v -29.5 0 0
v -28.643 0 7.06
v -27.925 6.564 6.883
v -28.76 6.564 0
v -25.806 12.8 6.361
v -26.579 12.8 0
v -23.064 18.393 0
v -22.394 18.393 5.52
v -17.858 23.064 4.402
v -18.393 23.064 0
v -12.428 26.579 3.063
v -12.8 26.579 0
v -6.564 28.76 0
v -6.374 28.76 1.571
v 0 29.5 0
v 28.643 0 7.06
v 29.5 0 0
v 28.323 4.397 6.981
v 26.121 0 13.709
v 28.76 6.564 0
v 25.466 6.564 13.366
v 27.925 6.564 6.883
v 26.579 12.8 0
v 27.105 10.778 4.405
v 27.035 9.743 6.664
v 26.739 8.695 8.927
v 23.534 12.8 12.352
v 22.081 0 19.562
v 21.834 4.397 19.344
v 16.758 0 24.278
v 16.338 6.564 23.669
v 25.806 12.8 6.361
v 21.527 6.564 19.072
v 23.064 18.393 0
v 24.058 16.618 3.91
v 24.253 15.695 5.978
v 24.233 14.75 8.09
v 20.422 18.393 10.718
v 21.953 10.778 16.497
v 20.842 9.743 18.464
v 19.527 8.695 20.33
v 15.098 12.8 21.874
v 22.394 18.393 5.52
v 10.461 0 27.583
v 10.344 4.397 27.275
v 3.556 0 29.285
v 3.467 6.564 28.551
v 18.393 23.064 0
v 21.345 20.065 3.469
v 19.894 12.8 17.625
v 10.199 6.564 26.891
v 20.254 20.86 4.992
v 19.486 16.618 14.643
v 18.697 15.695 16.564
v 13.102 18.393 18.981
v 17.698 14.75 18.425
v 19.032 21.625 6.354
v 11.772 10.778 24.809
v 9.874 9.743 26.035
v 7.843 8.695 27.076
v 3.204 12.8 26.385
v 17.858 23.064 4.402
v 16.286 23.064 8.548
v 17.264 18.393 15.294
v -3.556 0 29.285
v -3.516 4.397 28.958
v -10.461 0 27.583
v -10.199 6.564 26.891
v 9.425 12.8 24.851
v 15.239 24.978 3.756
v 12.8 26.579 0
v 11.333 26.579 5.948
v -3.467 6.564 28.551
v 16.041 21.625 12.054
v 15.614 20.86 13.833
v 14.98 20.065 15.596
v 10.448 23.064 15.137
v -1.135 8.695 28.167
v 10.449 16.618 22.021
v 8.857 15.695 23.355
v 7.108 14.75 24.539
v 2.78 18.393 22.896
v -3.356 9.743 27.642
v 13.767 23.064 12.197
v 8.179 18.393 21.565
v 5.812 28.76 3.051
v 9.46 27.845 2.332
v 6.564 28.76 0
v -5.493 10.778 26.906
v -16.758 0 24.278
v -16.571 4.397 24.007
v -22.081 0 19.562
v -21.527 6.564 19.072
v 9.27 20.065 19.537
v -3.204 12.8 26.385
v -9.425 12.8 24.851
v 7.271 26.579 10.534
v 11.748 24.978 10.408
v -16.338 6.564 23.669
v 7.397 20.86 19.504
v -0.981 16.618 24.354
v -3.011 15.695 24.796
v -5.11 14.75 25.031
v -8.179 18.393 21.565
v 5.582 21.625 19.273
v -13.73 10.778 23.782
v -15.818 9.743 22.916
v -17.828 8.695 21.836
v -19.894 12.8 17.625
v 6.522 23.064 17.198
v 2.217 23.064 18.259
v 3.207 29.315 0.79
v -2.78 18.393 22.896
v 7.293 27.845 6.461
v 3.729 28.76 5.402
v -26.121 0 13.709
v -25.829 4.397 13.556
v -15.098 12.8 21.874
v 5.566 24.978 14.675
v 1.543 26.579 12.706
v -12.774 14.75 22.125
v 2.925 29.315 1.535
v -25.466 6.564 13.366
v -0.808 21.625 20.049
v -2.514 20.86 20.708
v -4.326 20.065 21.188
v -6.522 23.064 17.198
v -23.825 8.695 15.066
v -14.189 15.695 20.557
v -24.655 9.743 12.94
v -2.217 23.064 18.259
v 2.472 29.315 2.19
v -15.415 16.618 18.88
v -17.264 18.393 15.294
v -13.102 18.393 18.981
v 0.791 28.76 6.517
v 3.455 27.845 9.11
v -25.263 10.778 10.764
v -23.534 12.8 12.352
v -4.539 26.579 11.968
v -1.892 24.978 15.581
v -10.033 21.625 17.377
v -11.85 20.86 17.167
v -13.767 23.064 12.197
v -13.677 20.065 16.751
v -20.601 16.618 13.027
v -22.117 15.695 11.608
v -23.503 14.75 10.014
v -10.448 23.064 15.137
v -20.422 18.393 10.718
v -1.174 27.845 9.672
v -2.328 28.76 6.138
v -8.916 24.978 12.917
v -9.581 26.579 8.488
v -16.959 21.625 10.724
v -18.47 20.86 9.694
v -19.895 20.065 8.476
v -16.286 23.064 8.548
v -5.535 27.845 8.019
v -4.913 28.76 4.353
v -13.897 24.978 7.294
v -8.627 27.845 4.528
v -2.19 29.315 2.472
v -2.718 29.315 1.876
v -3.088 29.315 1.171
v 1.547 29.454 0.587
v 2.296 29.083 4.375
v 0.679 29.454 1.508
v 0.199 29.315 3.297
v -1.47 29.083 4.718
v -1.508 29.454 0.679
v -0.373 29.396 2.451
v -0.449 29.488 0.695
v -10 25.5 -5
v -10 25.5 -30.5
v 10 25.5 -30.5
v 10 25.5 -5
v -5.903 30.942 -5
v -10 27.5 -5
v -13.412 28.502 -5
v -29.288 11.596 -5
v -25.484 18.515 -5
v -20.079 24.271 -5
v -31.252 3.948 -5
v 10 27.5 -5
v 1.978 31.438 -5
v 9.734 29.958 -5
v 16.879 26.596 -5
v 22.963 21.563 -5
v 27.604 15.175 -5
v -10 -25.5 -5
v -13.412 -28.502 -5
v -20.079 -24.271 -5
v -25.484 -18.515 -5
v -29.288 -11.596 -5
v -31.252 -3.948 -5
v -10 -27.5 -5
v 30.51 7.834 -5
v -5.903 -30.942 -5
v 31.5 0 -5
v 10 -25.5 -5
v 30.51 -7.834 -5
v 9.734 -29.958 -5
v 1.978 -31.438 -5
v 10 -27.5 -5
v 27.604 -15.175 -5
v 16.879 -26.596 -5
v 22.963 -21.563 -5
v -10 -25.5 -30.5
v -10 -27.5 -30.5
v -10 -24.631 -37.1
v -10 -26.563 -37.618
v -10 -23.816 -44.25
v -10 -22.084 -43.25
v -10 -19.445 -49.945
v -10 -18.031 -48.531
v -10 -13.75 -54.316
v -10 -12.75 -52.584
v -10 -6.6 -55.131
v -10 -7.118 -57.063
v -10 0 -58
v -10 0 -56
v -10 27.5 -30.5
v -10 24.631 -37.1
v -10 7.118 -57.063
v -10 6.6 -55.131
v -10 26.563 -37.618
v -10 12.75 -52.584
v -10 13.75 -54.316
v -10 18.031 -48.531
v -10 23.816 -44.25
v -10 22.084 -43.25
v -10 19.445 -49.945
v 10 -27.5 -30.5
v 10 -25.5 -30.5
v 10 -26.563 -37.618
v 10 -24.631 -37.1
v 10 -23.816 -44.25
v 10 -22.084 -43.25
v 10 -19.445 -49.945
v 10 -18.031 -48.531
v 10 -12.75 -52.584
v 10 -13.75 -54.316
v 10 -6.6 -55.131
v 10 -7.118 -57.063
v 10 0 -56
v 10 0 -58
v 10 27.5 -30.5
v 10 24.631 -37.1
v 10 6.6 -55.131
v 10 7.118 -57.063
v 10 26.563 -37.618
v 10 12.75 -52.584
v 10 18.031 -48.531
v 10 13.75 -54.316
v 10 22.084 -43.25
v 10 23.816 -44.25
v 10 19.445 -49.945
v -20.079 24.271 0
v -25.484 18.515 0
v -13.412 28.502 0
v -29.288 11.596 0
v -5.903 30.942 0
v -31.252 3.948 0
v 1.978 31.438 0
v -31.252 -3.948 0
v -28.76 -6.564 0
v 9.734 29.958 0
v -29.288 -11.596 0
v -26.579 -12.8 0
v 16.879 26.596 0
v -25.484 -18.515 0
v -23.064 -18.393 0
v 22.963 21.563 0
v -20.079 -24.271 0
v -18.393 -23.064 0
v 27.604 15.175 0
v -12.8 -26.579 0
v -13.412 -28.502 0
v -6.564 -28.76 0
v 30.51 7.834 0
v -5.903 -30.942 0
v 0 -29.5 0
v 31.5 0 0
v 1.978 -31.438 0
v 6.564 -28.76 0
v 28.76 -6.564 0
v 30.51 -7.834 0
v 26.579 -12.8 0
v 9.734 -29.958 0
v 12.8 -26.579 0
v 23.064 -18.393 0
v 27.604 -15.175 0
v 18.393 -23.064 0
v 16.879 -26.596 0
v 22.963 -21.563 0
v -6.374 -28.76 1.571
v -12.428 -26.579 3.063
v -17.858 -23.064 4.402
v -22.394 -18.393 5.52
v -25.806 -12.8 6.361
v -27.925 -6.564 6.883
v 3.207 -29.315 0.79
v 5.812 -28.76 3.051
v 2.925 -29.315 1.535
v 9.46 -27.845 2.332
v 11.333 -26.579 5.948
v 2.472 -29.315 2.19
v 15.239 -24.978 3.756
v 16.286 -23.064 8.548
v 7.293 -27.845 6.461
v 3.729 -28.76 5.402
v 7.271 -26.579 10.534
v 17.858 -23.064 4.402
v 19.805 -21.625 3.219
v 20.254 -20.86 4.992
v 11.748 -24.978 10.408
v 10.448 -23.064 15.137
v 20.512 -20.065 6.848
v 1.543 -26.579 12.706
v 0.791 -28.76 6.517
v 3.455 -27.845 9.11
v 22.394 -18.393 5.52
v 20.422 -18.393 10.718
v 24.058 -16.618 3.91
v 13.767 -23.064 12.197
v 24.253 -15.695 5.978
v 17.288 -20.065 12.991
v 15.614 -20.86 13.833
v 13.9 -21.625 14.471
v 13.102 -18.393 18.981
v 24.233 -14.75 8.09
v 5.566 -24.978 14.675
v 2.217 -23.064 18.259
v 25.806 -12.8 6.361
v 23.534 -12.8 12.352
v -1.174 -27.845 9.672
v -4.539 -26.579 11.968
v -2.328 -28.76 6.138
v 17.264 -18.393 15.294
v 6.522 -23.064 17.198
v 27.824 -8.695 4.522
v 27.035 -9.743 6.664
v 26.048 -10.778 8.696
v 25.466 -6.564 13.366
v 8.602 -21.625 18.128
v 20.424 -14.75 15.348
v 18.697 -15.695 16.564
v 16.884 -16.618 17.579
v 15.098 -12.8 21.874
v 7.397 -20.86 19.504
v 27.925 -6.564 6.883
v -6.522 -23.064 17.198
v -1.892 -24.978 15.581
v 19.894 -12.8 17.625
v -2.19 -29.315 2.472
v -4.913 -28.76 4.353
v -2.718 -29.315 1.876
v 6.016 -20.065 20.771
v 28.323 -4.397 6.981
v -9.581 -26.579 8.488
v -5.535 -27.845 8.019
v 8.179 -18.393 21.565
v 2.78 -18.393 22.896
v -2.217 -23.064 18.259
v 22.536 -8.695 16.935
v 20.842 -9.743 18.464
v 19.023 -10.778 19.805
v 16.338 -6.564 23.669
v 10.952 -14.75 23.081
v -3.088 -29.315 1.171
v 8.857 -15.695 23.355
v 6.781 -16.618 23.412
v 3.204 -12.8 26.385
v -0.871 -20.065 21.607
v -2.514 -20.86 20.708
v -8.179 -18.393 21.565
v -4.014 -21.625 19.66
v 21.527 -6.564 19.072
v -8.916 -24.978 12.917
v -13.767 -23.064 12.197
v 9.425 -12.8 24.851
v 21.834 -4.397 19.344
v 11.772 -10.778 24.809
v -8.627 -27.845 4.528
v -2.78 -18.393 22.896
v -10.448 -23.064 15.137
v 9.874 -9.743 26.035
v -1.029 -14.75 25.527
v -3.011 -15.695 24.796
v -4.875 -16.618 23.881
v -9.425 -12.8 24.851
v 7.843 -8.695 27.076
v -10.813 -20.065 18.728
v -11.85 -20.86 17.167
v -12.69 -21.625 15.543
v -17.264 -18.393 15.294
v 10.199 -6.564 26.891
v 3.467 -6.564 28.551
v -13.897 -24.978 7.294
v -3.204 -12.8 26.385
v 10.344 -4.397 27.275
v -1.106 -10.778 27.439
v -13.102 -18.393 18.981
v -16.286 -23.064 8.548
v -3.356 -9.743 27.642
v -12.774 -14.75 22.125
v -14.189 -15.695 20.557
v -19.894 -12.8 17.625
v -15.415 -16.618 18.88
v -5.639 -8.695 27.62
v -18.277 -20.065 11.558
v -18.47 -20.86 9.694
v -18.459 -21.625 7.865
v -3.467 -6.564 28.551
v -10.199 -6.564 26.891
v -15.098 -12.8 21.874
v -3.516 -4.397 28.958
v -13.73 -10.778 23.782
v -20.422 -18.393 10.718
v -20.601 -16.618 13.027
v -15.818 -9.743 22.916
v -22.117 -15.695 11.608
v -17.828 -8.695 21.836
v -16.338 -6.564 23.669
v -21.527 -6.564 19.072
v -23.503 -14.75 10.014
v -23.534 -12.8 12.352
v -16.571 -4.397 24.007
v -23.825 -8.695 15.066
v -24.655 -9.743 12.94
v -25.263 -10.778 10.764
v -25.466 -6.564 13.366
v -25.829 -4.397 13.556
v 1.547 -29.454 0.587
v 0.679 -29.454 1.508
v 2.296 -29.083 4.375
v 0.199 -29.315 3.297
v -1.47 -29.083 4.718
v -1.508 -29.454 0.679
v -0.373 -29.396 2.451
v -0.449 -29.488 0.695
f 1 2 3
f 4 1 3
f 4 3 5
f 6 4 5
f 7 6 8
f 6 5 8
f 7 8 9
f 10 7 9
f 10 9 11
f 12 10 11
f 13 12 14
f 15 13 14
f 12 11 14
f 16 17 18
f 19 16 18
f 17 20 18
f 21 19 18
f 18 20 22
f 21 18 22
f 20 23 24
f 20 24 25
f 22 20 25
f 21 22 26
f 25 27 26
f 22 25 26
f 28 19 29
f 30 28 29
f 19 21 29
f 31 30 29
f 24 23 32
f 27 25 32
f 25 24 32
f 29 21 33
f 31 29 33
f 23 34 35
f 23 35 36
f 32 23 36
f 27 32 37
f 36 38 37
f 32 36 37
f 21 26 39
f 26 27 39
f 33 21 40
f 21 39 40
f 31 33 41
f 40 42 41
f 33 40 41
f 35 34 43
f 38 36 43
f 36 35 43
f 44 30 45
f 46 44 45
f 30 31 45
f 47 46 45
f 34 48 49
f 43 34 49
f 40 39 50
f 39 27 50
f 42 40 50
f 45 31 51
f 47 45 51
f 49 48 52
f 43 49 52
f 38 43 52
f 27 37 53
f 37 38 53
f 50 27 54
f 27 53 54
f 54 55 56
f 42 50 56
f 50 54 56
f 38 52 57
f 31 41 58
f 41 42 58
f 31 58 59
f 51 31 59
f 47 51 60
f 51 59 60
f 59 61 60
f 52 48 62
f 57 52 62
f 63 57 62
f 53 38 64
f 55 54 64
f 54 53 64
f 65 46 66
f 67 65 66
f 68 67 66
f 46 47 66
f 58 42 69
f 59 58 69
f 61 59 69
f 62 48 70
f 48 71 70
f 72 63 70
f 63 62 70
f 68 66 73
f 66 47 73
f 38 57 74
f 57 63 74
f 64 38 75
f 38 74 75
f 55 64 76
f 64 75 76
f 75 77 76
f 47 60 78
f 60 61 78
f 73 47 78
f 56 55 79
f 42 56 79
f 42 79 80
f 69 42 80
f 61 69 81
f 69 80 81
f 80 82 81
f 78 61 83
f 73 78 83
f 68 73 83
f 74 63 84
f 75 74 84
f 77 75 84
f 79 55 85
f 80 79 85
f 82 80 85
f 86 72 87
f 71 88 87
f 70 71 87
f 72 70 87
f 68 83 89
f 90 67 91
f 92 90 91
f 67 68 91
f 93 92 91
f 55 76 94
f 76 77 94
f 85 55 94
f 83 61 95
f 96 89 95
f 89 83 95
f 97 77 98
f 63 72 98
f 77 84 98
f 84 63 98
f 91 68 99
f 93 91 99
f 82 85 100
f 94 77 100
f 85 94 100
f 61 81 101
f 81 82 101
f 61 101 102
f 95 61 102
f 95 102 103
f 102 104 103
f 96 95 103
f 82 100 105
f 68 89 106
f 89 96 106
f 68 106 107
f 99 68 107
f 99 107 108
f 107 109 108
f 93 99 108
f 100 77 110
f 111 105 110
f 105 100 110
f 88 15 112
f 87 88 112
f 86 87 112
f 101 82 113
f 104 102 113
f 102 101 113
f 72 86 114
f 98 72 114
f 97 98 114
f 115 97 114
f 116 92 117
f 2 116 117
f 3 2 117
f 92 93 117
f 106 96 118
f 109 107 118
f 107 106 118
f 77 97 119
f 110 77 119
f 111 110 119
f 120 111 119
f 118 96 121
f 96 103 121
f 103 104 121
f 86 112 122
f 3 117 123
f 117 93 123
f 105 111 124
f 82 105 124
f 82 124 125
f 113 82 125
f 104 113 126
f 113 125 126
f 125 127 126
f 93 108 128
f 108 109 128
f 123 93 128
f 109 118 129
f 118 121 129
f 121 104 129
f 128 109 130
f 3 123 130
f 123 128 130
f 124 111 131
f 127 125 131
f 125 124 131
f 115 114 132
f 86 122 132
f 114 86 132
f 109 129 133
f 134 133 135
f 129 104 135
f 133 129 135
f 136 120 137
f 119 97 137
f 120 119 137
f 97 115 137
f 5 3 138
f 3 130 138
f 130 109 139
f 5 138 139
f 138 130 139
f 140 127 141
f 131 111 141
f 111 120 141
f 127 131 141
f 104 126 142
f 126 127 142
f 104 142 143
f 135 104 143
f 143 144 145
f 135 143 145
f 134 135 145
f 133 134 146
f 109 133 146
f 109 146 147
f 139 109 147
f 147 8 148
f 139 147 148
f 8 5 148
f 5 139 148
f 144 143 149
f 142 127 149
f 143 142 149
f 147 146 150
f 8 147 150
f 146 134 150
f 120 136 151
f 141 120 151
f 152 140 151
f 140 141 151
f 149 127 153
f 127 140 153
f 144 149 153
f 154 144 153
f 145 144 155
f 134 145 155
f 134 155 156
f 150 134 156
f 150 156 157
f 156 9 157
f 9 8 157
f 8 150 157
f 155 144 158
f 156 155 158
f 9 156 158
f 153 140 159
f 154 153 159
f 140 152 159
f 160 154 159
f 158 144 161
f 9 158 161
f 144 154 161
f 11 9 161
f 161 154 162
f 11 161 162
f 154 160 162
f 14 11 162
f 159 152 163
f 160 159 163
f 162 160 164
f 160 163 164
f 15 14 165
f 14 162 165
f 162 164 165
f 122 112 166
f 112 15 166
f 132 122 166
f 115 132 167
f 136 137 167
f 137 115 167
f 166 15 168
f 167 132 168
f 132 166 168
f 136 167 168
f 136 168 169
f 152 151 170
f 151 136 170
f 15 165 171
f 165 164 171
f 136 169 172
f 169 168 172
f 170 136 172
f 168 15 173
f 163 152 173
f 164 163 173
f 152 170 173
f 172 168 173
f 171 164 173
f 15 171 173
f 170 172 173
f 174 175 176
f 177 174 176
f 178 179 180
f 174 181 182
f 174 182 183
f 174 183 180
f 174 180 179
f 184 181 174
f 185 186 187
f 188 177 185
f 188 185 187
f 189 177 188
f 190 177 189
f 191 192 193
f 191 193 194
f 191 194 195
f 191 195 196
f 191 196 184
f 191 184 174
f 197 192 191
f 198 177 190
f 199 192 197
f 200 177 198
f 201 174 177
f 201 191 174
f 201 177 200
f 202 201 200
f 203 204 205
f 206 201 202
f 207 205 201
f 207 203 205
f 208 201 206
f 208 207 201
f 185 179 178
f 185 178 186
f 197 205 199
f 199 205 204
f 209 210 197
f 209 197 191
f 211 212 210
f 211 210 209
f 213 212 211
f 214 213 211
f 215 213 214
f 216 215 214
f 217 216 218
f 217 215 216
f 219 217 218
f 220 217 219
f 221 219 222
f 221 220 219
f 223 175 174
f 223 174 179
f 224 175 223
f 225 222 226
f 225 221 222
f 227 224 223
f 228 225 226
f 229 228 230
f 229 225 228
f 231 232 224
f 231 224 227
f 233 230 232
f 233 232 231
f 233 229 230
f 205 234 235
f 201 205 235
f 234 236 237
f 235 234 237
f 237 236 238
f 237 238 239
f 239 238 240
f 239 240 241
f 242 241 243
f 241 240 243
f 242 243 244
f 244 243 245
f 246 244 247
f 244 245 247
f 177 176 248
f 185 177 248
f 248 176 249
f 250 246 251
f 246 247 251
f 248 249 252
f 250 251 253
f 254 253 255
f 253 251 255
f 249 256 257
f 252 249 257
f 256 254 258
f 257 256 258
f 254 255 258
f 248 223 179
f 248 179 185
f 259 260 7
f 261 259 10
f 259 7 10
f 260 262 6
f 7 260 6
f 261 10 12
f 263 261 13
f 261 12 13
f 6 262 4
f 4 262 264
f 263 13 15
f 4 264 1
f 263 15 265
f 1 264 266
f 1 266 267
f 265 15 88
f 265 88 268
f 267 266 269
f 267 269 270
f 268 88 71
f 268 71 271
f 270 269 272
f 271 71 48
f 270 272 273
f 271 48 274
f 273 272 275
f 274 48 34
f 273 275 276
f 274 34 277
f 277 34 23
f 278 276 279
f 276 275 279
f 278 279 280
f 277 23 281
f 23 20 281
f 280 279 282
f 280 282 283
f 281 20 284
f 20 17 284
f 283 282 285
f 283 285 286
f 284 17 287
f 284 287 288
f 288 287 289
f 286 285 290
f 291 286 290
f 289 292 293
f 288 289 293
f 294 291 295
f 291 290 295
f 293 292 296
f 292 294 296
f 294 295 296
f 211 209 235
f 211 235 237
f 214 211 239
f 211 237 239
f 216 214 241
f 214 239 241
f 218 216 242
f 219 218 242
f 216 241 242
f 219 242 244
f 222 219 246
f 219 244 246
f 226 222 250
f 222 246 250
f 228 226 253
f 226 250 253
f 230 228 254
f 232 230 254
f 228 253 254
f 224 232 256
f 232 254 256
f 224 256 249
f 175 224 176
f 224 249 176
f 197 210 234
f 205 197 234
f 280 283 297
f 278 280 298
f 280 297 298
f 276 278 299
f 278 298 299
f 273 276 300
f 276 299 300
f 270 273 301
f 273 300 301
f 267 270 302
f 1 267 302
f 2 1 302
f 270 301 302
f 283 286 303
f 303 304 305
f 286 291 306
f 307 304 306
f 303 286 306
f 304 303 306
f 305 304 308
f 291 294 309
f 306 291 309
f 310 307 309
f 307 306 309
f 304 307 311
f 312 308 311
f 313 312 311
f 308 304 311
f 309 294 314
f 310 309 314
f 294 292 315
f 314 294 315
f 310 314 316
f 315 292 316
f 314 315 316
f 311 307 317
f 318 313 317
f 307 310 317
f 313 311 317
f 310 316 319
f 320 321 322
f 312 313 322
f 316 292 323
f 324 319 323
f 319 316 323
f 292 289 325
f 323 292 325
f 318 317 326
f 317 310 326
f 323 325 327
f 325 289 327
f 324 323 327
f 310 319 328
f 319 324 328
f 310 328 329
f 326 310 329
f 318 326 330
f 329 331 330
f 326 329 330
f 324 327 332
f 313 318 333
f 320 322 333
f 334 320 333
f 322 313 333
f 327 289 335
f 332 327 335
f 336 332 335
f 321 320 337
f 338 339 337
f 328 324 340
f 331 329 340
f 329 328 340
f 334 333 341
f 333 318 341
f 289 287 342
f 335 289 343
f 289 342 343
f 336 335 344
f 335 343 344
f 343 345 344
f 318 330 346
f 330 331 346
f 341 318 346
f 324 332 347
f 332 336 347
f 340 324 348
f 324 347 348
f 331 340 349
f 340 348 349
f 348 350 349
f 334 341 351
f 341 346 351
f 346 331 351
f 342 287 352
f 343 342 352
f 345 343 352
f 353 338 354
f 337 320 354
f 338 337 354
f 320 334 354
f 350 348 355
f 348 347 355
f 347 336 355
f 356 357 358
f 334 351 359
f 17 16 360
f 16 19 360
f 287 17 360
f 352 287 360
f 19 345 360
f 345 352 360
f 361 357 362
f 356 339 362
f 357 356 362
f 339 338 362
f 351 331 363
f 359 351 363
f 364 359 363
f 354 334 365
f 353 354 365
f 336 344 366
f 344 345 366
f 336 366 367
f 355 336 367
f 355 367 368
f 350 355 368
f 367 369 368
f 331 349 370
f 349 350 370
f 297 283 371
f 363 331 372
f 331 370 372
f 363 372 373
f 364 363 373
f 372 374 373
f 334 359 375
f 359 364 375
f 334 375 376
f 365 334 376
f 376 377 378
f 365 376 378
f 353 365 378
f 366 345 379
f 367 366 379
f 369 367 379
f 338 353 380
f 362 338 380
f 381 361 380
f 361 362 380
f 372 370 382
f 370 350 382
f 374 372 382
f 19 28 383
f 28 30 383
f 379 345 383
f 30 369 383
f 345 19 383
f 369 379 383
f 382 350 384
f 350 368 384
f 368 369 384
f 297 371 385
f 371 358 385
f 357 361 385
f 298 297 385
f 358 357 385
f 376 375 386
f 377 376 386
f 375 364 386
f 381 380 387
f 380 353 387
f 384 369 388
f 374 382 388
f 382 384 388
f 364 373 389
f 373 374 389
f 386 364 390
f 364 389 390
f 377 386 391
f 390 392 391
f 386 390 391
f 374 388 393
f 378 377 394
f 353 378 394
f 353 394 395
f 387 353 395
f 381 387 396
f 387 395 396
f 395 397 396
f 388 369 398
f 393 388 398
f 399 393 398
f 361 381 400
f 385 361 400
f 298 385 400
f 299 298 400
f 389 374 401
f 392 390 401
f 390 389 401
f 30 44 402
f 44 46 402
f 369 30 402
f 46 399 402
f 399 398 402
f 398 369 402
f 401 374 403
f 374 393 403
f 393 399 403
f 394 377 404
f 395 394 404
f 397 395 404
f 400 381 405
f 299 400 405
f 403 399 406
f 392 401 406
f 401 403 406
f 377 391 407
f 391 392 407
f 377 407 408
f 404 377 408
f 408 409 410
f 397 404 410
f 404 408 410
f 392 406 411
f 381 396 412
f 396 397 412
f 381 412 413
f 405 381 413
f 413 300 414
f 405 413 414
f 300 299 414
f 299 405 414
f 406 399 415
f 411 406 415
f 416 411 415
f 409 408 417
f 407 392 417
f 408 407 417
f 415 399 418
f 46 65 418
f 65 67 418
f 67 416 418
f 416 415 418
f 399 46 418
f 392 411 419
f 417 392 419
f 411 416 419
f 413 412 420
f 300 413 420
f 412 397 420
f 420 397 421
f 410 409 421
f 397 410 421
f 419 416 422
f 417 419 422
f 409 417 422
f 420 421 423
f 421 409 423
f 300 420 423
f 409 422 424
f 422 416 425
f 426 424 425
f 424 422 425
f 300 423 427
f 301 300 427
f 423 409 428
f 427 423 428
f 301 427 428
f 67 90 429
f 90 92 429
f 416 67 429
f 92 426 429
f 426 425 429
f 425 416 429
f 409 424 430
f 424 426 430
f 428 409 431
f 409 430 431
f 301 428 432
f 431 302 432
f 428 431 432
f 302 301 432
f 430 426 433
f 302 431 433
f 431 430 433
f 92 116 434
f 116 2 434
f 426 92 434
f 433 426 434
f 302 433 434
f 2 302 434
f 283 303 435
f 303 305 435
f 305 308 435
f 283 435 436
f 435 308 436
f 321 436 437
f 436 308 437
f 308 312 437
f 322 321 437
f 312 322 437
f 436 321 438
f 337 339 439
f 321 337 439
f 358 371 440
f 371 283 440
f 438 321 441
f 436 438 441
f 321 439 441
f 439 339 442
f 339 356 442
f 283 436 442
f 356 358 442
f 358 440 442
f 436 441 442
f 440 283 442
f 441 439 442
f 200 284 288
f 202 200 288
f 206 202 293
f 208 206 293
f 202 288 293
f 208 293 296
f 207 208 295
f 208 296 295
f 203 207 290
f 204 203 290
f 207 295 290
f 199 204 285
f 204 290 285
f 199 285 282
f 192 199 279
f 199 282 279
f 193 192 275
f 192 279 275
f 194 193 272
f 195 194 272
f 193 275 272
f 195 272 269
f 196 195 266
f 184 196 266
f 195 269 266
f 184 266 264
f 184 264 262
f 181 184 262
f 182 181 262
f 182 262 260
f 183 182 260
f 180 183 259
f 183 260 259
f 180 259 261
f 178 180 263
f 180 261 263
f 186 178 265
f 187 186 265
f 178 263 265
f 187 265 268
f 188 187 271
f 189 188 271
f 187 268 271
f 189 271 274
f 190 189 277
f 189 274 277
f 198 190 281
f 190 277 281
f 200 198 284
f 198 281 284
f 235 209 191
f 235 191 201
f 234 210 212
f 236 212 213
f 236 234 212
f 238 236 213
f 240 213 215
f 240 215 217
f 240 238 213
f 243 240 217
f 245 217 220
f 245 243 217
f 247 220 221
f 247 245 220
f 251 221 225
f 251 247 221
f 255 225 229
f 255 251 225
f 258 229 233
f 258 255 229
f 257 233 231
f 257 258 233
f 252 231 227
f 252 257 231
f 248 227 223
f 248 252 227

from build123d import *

# Parameters (mm, degrees)
F1_ANGLE = 180
F2_R     = 31.5
F3_DEPTH = 5
F4_W     = 20
F4_H     = 2
F5_DEPTH = 25.5
F6_W     = 20
F6_H     = 2
F7_ANGLE = 180


with BuildPart() as f1:
    # F0 (on Top) → F1 (revolve)
    with BuildSketch(Plane.XY):
        with BuildLine():
            ThreePointArc((0, -29.5), (20.85965, -20.85965), (29.5, 0))
            ThreePointArc((29.5, 0), (20.85965, 20.85965), (0, 29.5))
            Line((0, 29.5), (0, -29.5))
        make_face()
    revolve(axis=Axis((0, 0, 0), (0, -1, 0)), revolution_arc=F1_ANGLE)

    # F2 (on face) → F3 (join)
    with BuildSketch(Plane(origin=(0, 0, 0), x_dir=(1, 0, 0), z_dir=(0, 0, -1))):
        Circle(F2_R)
    extrude(amount=F3_DEPTH)

    # F4 (on face) → F5 (join)
    with BuildSketch(Plane(origin=(0, 0, -5), x_dir=(1, 0, 0), z_dir=(0, 0, -1))):
        with Locations((0, 26.5)):
            Rectangle(F4_W, F4_H)
        with Locations((0, -26.5)):
            Rectangle(F4_W, F4_H)
    extrude(amount=F5_DEPTH)

    # F6 (on face) → F7 (revolve)
    with BuildSketch(Plane(origin=(0, 0, -30.5), x_dir=(1, 0, 0), z_dir=(0, 0, -1))):
        with Locations((0, 26.5)):
            Rectangle(F6_W, F6_H)
    revolve(axis=Axis((7.741019, 0, -30.5), (1, 0, 0)), revolution_arc=F7_ANGLE)


solid = f1.part
